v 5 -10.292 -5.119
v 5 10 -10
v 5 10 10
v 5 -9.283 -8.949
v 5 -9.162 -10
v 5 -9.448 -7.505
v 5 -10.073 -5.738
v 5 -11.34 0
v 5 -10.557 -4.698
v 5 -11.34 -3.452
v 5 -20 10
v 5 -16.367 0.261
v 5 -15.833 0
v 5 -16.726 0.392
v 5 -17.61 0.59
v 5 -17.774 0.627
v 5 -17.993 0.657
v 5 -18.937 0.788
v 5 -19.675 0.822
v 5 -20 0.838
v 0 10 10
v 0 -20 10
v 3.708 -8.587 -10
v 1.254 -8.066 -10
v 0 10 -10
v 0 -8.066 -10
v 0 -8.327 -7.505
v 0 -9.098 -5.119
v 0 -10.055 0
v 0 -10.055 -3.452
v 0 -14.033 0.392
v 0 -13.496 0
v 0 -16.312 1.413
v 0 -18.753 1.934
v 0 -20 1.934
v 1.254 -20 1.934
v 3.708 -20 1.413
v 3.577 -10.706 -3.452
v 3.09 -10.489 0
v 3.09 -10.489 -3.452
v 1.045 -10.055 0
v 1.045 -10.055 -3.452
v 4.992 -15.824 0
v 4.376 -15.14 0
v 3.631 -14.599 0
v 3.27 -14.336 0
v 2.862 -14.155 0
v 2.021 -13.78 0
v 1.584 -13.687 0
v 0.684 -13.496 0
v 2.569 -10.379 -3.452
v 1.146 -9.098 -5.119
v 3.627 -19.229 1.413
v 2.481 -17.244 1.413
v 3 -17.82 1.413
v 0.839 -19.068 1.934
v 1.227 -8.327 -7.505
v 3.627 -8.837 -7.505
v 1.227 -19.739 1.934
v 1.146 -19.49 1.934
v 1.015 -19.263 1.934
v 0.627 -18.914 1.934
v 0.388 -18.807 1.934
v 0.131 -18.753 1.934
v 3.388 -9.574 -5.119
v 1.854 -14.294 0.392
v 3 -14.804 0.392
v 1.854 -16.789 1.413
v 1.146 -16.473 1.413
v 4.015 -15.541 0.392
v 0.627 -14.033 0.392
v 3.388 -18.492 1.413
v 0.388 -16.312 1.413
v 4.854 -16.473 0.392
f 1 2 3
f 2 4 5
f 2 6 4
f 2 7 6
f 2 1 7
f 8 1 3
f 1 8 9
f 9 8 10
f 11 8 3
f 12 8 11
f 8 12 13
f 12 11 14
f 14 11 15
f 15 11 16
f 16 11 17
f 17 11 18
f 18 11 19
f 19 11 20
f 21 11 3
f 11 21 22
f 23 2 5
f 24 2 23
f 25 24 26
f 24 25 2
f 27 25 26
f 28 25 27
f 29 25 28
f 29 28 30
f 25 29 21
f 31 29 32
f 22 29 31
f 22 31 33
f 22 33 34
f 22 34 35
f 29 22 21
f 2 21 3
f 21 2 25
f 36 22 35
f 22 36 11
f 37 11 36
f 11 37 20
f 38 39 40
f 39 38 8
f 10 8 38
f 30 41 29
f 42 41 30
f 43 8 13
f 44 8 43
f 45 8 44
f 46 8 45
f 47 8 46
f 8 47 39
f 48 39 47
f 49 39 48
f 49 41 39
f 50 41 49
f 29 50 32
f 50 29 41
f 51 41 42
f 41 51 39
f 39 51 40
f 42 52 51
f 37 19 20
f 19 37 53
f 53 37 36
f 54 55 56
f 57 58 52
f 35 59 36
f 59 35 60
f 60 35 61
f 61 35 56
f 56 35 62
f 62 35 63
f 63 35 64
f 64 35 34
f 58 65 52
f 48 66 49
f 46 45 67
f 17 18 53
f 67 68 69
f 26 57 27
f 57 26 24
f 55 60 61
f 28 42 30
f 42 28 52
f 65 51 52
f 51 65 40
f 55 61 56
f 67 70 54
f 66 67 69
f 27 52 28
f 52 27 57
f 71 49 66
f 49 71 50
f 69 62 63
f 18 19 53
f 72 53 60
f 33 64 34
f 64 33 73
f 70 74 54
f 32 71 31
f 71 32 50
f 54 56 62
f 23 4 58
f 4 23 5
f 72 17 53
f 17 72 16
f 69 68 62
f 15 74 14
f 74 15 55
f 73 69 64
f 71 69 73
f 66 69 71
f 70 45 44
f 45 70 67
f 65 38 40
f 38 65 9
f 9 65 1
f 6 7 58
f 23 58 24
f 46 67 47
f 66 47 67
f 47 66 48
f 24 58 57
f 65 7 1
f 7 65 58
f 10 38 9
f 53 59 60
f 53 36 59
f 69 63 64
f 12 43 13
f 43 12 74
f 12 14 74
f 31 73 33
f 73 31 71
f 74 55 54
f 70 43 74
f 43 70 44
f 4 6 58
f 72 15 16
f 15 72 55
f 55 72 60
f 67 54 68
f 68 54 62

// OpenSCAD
// Generated by generate_scads.py
translate([0,-20,-10]) {
  difference() {
    cube(size=[5,30,20], center=false);
    cylinder(h=20, r=10, center=true);
    sphere(r=12);
    cylinder(h=5, r=10, center=true);
  }
}
